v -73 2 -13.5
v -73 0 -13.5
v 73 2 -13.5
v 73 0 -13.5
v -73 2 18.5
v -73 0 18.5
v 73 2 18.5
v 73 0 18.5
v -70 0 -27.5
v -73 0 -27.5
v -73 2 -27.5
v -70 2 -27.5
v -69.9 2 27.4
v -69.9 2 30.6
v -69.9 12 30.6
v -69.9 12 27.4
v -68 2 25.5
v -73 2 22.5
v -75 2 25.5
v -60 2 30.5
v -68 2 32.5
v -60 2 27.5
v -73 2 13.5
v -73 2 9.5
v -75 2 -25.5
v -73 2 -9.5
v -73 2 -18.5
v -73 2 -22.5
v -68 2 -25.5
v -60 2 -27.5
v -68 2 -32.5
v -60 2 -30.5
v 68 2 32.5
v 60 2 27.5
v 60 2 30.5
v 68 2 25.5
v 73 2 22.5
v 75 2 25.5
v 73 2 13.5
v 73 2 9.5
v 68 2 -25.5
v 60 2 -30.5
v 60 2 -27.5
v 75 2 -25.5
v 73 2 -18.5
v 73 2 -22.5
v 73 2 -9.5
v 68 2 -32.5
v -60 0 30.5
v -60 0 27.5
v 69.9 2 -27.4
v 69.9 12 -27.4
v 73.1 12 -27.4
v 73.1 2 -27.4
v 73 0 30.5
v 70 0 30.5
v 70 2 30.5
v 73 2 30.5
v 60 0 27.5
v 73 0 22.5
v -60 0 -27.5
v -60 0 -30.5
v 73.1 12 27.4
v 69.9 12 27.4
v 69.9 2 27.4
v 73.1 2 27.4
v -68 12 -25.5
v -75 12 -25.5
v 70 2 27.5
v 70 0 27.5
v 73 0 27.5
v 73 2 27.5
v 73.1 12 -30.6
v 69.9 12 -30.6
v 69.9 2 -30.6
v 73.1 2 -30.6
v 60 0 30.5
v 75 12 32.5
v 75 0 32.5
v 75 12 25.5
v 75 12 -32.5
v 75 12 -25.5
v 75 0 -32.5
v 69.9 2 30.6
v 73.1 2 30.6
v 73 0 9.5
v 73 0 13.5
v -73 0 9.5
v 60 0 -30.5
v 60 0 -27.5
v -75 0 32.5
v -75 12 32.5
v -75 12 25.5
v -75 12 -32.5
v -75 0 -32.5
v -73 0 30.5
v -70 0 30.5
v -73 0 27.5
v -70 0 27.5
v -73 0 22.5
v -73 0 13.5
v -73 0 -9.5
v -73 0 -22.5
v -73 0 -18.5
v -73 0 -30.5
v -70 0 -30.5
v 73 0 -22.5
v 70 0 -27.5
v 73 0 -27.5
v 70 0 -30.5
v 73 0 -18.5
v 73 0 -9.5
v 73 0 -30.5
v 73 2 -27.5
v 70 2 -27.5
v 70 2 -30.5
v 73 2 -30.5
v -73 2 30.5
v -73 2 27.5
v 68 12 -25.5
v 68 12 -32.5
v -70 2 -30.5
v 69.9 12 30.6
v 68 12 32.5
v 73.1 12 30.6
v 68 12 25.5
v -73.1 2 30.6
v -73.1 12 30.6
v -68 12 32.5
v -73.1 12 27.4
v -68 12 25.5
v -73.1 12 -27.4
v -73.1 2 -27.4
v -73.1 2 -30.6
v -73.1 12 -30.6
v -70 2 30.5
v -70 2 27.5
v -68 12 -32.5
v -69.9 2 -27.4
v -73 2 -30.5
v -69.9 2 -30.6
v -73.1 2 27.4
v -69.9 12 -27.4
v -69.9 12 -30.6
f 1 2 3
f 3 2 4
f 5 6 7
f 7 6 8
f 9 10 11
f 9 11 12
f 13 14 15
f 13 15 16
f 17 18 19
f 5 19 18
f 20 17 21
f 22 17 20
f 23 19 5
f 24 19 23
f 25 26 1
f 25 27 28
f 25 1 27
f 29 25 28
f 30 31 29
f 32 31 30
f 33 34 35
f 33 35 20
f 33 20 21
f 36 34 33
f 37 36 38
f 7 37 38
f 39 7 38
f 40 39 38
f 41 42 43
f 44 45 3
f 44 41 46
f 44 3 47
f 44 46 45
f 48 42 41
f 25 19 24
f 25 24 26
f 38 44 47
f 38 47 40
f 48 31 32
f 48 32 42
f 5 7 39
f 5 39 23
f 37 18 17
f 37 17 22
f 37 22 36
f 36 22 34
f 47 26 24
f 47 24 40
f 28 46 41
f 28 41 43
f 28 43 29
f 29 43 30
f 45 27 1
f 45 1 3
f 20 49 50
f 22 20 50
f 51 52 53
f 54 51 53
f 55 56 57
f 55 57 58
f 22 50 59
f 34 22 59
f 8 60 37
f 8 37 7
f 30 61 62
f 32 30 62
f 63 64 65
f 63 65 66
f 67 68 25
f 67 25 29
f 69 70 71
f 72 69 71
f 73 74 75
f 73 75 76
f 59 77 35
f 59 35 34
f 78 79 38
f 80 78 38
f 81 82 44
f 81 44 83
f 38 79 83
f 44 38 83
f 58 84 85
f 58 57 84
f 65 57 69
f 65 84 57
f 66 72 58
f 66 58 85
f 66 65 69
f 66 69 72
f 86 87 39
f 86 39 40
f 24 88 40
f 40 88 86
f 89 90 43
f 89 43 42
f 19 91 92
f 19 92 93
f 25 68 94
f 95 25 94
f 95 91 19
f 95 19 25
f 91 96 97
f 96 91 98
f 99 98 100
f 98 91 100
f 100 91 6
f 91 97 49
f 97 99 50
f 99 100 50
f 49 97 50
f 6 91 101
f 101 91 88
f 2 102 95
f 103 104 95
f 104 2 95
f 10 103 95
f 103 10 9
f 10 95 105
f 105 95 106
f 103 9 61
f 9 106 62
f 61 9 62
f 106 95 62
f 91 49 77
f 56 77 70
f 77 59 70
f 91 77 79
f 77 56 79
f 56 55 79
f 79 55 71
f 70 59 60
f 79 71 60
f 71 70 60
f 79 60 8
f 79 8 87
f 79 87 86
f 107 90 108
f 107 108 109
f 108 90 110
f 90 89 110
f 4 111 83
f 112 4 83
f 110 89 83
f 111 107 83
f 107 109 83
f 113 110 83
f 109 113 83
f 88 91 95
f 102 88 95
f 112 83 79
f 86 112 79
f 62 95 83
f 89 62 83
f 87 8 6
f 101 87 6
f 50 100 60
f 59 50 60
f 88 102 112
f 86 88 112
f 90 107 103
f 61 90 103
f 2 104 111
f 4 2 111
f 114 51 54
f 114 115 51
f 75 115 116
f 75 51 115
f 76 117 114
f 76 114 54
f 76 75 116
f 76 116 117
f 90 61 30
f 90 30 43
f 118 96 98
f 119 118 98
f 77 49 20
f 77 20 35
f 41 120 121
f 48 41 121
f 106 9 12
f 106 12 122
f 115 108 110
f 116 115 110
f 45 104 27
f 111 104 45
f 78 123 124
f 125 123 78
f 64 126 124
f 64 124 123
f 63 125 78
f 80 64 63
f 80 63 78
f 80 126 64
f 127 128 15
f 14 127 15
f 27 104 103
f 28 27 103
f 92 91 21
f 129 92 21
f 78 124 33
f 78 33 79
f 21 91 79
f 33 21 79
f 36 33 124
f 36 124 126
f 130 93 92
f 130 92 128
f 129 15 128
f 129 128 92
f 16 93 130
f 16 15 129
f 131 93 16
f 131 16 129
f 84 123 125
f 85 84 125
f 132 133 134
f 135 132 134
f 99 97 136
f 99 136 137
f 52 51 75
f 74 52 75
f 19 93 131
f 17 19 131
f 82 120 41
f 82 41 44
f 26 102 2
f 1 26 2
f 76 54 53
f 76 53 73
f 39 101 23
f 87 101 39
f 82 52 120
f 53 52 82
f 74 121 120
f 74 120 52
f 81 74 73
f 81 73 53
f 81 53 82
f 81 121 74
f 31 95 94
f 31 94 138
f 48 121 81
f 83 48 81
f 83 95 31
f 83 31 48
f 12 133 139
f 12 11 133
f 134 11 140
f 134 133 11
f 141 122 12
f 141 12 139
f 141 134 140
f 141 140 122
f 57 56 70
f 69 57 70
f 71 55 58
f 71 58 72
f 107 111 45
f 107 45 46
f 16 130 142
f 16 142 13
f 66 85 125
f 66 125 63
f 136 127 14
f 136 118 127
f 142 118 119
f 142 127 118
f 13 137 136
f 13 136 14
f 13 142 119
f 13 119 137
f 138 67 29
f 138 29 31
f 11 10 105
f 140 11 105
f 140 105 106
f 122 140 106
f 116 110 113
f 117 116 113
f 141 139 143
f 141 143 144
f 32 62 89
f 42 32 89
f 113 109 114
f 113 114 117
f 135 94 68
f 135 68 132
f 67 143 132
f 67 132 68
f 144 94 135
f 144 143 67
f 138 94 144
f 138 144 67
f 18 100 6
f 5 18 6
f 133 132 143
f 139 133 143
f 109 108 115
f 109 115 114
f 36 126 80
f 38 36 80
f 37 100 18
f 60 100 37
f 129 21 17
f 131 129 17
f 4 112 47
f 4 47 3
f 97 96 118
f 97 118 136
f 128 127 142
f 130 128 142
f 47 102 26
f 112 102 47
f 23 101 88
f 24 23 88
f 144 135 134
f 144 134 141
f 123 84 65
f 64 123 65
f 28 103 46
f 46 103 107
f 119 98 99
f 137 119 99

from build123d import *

# Parameters (mm, degrees)
SKETCH1_W               = 150
SKETCH1_H               = 65
BOSS_EXTRUDE1_DEPTH     = 2
BOSS_EXTRUDE2_START     = 2
SKETCH2_W               = 3
SKETCH2_H               = 3
BOSS_EXTRUDE2_DEPTH     = 50
CUT_EXTRUDE2_DEPTH      = 96.818839484
CUT_EXTRUDE2_DEPTH_BACK = 96.818839484
SKETCH4_W               = 120
SKETCH4_H               = 3
SKETCH4_W_2             = 146
SKETCH4_H_2             = 4
SKETCH5_W               = 7
SKETCH5_H               = 7
SKETCH5_W_2             = 3.2
SKETCH5_H_2             = 3.2
BOSS_EXTRUDE3_DEPTH     = 50
SKETCH2_3_W             = 3
SKETCH2_3_H             = 3
CUT_EXTRUDE3_DEPTH      = 52
CUT_EXTRUDE4_DEPTH      = 97.877499968
CUT_EXTRUDE4_DEPTH_BACK = 97.877499968
SKETCH6_W               = 182.778356439
SKETCH6_H               = 52.909524232


with BuildPart() as part:
    # Sketch1 → Boss-Extrude1 (new body)
    with BuildSketch(Plane(origin=(0, 0, 0), x_dir=(1, 0, 0), z_dir=(0, 1, 0))):
        Rectangle(SKETCH1_W, SKETCH1_H)
    extrude(amount=BOSS_EXTRUDE1_DEPTH)

    # Sketch2 → Boss-Extrude2 (add)
    with BuildSketch(Plane(origin=(0, 0, 0), x_dir=(1, 0, 0), z_dir=(0, 1, 0)).offset(BOSS_EXTRUDE2_START)):
        with Locations((71.5, 29)):
            Rectangle(SKETCH2_W, SKETCH2_H)
        with Locations((-71.5, 29)):
            Rectangle(SKETCH2_W, SKETCH2_H)
        with Locations((-71.5, -29)):
            Rectangle(SKETCH2_W, SKETCH2_H)
        with Locations((71.5, -29)):
            Rectangle(SKETCH2_W, SKETCH2_H)
    extrude(amount=BOSS_EXTRUDE2_DEPTH)

    # Sketch4 → Cut-Extrude2 (cut, two sides: drawn at the far end of the back side and taken through both)
    with BuildSketch(Plane(origin=(0, 2, 0), x_dir=(1, 0, 0), z_dir=(0, 1, 0)).offset(-CUT_EXTRUDE2_DEPTH_BACK)):
        with Locations((0, 29)):
            Rectangle(SKETCH4_W, SKETCH4_H)
        with Locations((0, 20.5)):
            Rectangle(SKETCH4_W_2, SKETCH4_H_2)
        with Locations((0, 11.5)):
            Rectangle(SKETCH4_W_2, SKETCH4_H_2)
        with Locations((0, -11.5)):
            Rectangle(SKETCH4_W_2, SKETCH4_H_2)
        with Locations((0, -20.5)):
            Rectangle(SKETCH4_W_2, SKETCH4_H_2)
        with Locations((0, -29)):
            Rectangle(SKETCH4_W, SKETCH4_H)
    extrude(amount=CUT_EXTRUDE2_DEPTH + CUT_EXTRUDE2_DEPTH_BACK, mode=Mode.SUBTRACT)

    # Sketch5 → Boss-Extrude3 (add)
    # profile 1 of 4: a face of its own
    with BuildSketch(Plane(origin=(0, 2, 0), x_dir=(1, 0, 0), z_dir=(0, 1, 0))):
        with Locations((71.5, 29)):
            Rectangle(SKETCH5_W, SKETCH5_H)
        with Locations((71.5, 29)):
            Rectangle(SKETCH5_W_2, SKETCH5_H_2, mode=Mode.SUBTRACT)
    # profile 2 of 4: a face of its own
    with BuildSketch(Plane(origin=(0, 2, 0), x_dir=(1, 0, 0), z_dir=(0, 1, 0))):
        with Locations((71.5, -29)):
            Rectangle(SKETCH5_W, SKETCH5_H)
        with Locations((71.5, -29)):
            Rectangle(SKETCH5_W_2, SKETCH5_H_2, mode=Mode.SUBTRACT)
    # profile 3 of 4: a face of its own
    with BuildSketch(Plane(origin=(0, 2, 0), x_dir=(1, 0, 0), z_dir=(0, 1, 0))):
        with Locations((-71.5, -29)):
            Rectangle(SKETCH5_W, SKETCH5_H)
        with Locations((-71.5, -29)):
            Rectangle(SKETCH5_W_2, SKETCH5_H_2, mode=Mode.SUBTRACT)
    # profile 4 of 4: a face of its own
    with BuildSketch(Plane(origin=(0, 2, 0), x_dir=(1, 0, 0), z_dir=(0, 1, 0))):
        with Locations((-71.5, 29)):
            Rectangle(SKETCH5_W, SKETCH5_H)
        with Locations((-71.5, 29)):
            Rectangle(SKETCH5_W_2, SKETCH5_H_2, mode=Mode.SUBTRACT)
    extrude(amount=BOSS_EXTRUDE3_DEPTH)

    # Sketch2<3> → Cut-Extrude3 (cut)
    with BuildSketch(Plane(origin=(0, 0, 0), x_dir=(1, 0, 0), z_dir=(0, 1, 0))):
        with Locations((71.5, 29)):
            Rectangle(SKETCH2_3_W, SKETCH2_3_H)
        with Locations((-71.5, 29)):
            Rectangle(SKETCH2_3_W, SKETCH2_3_H)
        with Locations((-71.5, -29)):
            Rectangle(SKETCH2_3_W, SKETCH2_3_H)
        with Locations((71.5, -29)):
            Rectangle(SKETCH2_3_W, SKETCH2_3_H)
    extrude(amount=CUT_EXTRUDE3_DEPTH, mode=Mode.SUBTRACT)

    # Sketch6 → Cut-Extrude4 (cut, two sides: drawn at the far end of the back side and taken through both)
    with BuildSketch(Plane.XY.offset(-CUT_EXTRUDE4_DEPTH_BACK)):
        with Locations((0.082930289, 38.454762116)):
            Rectangle(SKETCH6_W, SKETCH6_H)
    extrude(amount=CUT_EXTRUDE4_DEPTH + CUT_EXTRUDE4_DEPTH_BACK, mode=Mode.SUBTRACT)


solid = part.part
